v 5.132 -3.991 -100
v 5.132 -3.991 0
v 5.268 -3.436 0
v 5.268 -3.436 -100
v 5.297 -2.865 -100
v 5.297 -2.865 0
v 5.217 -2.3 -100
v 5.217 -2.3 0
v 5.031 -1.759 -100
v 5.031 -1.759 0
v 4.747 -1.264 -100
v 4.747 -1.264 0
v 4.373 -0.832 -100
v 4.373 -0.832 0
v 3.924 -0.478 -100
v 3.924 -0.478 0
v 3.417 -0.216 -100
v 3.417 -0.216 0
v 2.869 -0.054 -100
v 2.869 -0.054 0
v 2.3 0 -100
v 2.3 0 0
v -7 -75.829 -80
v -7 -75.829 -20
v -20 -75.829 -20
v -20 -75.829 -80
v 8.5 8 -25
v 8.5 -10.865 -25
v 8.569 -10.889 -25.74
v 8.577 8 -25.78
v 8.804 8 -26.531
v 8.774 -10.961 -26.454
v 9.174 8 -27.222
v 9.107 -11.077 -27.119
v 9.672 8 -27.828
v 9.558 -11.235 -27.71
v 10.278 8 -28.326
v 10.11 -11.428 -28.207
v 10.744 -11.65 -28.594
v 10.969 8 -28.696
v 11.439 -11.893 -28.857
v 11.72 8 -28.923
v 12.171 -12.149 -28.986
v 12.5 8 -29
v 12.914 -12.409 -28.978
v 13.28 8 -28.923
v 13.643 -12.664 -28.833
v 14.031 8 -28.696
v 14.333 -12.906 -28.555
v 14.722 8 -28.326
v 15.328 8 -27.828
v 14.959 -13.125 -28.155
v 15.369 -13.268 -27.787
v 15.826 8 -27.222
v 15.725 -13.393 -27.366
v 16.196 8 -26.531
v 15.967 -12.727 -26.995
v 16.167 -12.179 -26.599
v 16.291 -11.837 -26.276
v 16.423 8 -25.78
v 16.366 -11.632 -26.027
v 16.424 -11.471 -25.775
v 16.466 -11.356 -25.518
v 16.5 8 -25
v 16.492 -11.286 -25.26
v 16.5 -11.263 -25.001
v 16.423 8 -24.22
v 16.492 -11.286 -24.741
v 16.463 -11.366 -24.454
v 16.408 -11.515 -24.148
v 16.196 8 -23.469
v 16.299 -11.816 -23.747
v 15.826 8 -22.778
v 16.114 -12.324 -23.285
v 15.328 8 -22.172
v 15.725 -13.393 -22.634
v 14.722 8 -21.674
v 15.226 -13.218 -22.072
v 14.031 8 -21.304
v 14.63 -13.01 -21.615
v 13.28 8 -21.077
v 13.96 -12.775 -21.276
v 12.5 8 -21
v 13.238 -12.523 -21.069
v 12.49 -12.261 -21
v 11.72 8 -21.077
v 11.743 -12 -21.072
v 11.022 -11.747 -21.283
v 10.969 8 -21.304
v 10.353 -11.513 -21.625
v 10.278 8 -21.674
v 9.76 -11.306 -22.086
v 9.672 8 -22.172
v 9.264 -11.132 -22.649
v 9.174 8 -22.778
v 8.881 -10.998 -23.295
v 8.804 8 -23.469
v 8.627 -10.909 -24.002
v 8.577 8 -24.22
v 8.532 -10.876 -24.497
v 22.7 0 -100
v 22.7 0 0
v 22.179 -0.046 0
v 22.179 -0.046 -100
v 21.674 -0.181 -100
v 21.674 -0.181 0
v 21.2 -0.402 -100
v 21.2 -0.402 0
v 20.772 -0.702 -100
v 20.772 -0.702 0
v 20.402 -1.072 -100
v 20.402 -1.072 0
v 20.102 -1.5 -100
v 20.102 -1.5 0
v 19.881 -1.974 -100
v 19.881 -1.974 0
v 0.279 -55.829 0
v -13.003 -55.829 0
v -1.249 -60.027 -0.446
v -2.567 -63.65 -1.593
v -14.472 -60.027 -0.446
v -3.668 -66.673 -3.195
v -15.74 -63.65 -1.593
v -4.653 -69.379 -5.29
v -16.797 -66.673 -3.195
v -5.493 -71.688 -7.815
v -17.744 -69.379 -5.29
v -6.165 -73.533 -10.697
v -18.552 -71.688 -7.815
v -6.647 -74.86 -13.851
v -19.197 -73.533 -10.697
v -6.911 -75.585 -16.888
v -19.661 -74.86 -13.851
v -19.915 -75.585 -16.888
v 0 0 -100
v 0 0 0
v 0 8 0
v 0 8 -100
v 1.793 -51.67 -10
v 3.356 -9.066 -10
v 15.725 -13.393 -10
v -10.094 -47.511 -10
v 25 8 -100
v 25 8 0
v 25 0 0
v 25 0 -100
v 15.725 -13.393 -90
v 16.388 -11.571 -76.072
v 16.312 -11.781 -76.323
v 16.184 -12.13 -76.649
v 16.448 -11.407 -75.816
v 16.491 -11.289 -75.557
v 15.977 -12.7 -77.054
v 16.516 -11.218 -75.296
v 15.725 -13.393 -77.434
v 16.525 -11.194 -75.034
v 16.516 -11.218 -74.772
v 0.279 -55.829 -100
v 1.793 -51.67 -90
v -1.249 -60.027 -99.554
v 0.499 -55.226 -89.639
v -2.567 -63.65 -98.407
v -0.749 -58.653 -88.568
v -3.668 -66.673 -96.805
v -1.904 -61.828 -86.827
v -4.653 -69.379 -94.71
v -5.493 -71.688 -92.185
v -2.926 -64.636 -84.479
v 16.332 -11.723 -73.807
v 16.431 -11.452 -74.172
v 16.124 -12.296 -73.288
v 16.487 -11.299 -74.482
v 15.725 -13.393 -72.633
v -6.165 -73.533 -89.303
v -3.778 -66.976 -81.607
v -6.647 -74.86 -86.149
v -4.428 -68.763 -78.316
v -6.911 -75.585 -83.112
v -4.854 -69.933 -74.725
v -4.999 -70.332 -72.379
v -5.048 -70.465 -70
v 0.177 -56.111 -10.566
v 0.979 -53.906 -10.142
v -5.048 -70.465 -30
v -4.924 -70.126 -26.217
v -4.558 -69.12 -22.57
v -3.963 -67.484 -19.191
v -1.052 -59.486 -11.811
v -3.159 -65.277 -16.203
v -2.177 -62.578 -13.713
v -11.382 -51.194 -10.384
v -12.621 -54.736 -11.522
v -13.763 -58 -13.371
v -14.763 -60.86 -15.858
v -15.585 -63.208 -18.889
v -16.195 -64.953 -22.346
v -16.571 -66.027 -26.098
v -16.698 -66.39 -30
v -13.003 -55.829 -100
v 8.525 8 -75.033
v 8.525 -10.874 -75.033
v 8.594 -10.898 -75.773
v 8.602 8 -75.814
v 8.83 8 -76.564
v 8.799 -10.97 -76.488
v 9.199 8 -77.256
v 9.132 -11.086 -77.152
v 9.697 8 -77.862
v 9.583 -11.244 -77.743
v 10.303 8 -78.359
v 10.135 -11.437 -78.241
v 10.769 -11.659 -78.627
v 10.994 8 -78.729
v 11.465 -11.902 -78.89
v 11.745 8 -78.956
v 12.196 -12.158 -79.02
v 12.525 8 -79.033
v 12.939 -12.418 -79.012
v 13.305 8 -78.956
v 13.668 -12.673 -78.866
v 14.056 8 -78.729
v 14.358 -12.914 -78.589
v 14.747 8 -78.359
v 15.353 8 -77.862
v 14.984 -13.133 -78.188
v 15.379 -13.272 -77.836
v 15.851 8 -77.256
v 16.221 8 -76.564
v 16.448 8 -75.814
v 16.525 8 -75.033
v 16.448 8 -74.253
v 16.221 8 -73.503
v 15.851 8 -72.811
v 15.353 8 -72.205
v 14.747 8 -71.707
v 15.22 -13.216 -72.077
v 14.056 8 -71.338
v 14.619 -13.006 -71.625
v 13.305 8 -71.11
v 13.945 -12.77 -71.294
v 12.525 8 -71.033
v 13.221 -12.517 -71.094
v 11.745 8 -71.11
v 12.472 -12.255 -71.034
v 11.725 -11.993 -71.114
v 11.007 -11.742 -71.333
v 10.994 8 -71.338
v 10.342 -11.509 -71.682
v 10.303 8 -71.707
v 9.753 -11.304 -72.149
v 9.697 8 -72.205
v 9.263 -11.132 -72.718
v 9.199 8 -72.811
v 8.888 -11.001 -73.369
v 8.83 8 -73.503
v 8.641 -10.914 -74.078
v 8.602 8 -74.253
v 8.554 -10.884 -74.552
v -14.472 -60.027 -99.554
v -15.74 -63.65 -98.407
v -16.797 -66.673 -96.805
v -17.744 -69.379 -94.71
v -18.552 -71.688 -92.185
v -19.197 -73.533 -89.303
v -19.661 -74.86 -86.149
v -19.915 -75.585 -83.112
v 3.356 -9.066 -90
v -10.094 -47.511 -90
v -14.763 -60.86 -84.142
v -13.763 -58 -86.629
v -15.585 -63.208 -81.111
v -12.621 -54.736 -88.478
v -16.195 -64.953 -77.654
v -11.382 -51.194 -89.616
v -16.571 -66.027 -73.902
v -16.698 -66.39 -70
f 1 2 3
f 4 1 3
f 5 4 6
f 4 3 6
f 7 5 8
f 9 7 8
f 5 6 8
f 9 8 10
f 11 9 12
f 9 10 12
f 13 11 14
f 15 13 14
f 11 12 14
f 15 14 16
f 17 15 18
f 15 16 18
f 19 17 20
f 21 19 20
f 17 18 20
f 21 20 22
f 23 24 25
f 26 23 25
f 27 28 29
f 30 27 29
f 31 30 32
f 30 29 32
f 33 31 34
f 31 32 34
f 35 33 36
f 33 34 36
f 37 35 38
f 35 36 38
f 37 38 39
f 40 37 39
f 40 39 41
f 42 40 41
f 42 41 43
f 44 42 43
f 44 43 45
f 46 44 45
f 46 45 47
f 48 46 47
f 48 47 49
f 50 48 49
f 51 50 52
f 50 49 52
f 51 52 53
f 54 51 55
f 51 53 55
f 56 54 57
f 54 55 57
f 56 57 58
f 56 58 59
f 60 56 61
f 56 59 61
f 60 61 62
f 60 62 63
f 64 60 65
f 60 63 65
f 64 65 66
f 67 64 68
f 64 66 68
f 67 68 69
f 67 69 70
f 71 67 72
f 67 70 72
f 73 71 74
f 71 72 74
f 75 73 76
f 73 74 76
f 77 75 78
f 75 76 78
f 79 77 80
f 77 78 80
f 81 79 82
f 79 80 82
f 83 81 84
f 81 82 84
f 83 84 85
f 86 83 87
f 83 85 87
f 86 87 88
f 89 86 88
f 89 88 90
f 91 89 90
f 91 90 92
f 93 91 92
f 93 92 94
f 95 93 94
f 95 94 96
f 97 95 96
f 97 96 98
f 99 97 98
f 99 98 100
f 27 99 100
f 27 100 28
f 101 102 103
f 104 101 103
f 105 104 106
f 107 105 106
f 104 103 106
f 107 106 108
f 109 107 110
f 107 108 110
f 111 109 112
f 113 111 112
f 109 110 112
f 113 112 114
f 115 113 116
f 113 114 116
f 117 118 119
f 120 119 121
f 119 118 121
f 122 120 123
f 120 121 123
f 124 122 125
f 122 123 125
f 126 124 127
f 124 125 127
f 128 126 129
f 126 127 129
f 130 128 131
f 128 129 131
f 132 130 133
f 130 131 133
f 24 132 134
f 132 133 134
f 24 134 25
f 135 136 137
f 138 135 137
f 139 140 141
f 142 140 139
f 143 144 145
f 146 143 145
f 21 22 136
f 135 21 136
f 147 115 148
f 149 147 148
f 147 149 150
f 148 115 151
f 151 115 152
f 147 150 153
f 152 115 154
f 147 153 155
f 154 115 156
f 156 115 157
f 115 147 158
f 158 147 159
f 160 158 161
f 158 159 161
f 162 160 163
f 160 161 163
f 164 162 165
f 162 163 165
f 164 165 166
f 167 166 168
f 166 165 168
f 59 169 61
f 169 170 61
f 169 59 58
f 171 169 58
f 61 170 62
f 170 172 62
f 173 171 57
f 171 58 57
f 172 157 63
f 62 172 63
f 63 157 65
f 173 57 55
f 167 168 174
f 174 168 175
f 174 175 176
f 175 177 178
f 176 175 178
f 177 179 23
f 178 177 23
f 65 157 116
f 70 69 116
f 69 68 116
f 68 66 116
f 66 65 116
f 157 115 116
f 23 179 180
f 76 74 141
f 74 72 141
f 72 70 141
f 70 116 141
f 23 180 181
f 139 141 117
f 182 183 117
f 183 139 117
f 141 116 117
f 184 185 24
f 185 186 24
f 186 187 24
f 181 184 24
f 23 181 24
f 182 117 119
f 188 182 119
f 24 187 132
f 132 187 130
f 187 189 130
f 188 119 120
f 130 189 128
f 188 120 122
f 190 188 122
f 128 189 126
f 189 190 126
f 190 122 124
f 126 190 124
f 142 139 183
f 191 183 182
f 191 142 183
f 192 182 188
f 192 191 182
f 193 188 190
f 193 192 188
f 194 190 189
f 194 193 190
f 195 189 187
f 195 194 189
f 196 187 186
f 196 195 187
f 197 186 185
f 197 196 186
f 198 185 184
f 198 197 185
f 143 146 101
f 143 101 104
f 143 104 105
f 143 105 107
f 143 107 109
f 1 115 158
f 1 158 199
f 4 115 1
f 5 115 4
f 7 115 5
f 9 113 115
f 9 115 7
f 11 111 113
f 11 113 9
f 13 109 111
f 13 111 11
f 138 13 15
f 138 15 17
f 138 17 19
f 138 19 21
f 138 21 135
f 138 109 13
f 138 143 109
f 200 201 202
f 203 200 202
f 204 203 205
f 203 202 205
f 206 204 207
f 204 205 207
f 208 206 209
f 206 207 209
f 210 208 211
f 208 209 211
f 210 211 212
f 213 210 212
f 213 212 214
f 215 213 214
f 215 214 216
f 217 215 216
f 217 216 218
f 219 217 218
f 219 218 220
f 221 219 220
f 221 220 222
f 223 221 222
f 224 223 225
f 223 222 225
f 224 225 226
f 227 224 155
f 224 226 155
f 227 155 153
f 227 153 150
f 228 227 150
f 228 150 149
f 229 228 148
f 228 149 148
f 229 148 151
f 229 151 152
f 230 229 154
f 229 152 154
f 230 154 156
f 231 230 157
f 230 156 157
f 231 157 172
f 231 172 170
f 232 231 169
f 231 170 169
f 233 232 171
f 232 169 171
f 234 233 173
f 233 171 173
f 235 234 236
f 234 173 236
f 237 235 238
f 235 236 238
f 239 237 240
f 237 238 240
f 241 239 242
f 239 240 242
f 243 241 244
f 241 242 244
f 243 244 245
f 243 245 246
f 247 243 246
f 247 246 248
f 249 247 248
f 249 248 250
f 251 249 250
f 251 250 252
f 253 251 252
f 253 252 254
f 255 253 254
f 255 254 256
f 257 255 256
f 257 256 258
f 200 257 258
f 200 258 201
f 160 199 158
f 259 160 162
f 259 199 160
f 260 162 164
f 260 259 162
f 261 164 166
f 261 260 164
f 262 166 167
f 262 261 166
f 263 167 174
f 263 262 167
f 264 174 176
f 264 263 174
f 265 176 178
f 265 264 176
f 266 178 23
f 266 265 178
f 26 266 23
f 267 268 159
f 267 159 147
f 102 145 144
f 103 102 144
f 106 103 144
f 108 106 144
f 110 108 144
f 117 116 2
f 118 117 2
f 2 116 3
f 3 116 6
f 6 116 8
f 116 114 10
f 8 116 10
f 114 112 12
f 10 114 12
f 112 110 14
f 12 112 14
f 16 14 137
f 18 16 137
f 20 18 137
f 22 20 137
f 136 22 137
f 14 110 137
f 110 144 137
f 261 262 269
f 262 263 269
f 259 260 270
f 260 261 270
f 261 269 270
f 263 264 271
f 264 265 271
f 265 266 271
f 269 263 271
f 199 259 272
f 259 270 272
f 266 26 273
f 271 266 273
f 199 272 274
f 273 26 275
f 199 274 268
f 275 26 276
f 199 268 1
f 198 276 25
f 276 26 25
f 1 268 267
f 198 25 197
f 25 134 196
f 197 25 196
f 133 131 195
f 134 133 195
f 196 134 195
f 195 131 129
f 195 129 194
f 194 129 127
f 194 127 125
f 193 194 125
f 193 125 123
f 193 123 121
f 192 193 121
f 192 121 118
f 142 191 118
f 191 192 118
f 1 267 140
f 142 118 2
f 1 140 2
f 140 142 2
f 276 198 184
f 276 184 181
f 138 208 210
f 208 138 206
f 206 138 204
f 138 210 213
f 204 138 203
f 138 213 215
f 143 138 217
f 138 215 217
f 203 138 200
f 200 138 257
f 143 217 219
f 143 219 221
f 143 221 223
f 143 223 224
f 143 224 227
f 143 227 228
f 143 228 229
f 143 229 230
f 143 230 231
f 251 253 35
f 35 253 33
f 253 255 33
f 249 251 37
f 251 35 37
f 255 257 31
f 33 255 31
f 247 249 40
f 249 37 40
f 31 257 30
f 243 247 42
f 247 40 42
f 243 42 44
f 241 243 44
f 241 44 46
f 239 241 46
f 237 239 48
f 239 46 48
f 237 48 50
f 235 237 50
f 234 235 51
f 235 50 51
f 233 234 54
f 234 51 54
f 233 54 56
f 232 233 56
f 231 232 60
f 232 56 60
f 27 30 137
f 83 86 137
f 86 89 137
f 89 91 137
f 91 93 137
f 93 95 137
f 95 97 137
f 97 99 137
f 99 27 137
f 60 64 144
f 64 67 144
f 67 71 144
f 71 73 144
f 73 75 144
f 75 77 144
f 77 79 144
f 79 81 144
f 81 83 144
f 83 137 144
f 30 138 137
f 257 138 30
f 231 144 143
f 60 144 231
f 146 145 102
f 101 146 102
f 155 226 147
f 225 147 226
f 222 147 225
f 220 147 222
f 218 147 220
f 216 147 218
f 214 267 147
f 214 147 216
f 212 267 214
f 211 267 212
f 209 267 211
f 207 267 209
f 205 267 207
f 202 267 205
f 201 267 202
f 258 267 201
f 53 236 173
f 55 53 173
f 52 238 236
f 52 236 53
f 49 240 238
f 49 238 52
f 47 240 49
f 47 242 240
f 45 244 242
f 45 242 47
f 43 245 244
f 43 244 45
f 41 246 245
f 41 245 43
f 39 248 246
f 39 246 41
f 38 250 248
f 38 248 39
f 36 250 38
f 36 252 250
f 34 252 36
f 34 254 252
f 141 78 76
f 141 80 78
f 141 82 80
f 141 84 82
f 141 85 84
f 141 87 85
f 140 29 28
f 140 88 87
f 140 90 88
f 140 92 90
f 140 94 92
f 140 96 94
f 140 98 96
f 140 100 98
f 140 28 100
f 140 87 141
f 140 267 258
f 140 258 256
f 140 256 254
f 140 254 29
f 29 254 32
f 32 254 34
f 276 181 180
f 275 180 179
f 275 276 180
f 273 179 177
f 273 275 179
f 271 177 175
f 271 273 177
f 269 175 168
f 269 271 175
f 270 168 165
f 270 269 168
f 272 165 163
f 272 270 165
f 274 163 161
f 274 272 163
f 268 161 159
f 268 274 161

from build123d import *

# Parameters (mm, degrees)
BOSS_EXTRUDE2_DEPTH   = 100
CUT_EXTRUDE1_DEPTH    = 127.933135767
FILLET1_R             = 20
F_1_0MM_DOWEL_HOLE2_D = 8


with BuildPart() as part:
    # Sketch1 → Boss-Extrude2 (new body)
    with BuildSketch(Plane.XY):
        with BuildLine():
            Line((0, 0), (0, 8))
            Line((0, 8), (25, 8))
            Line((25, 8), (25, 0))
            Line((25, 0), (22.7, 0))
            ThreePointArc((22.7, 0), (20.979270691, -0.542543867), (19.880922138, -1.97393957))
            Line((19.880922138, -1.97393957), (-7, -75.828666157))
            Line((-7, -75.828666157), (-20, -75.828666157))
            Line((-20, -75.828666157), (5.131717491, -3.99064426))
            ThreePointArc((5.131717491, -3.99064426), (4.746623467, -1.263902765), (2.3, 0))
            Line((2.3, 0), (0, 0))
        make_face()
    extrude(amount=-BOSS_EXTRUDE2_DEPTH)

    # Sketch3 → Cut-Extrude1 (cut, through all)
    with BuildSketch(Plane(origin=(5.815996282, -2.03466036, 0), x_dir=(0, 0, 1), z_dir=(-0.9439058304641529, 0.33021475317704674, 0))):
        with BuildLine():
            Line((-90, -7.448753356), (-10, -7.448753356))
            Line((-10, -7.448753356), (-10, -48.179415166))
            ThreePointArc((-10, -48.179415166), (-15.857864376, -62.321550789), (-30, -68.179415166))
            Line((-30, -68.179415166), (-70, -68.179415166))
            ThreePointArc((-70, -68.179415166), (-84.142135624, -62.321550789), (-90, -48.179415166))
            Line((-90, -48.179415166), (-90, -7.448753356))
        make_face()
    extrude(amount=-CUT_EXTRUDE1_DEPTH, mode=Mode.SUBTRACT)

    # Fillet1
    fillet1_edges = [part.edges().sort_by_distance(p)[0] for p in [
        (-13.5, -75.828666157, -100),
        (-13.5, -75.828666157, 0),
    ]]
    fillet(fillet1_edges, radius=FILLET1_R)

    # Ø1.0mm Dowel Hole2 (through all)
    with Locations(Plane(origin=(0, 8, 0), x_dir=(1, 0, 0), z_dir=(0, 1, 0))):
        with Locations((12.52505341, 75.033294682), (12.5, 25), (52.497529088, 47.667377925)):
            Hole(F_1_0MM_DOWEL_HOLE2_D / 2)


solid = part.part
